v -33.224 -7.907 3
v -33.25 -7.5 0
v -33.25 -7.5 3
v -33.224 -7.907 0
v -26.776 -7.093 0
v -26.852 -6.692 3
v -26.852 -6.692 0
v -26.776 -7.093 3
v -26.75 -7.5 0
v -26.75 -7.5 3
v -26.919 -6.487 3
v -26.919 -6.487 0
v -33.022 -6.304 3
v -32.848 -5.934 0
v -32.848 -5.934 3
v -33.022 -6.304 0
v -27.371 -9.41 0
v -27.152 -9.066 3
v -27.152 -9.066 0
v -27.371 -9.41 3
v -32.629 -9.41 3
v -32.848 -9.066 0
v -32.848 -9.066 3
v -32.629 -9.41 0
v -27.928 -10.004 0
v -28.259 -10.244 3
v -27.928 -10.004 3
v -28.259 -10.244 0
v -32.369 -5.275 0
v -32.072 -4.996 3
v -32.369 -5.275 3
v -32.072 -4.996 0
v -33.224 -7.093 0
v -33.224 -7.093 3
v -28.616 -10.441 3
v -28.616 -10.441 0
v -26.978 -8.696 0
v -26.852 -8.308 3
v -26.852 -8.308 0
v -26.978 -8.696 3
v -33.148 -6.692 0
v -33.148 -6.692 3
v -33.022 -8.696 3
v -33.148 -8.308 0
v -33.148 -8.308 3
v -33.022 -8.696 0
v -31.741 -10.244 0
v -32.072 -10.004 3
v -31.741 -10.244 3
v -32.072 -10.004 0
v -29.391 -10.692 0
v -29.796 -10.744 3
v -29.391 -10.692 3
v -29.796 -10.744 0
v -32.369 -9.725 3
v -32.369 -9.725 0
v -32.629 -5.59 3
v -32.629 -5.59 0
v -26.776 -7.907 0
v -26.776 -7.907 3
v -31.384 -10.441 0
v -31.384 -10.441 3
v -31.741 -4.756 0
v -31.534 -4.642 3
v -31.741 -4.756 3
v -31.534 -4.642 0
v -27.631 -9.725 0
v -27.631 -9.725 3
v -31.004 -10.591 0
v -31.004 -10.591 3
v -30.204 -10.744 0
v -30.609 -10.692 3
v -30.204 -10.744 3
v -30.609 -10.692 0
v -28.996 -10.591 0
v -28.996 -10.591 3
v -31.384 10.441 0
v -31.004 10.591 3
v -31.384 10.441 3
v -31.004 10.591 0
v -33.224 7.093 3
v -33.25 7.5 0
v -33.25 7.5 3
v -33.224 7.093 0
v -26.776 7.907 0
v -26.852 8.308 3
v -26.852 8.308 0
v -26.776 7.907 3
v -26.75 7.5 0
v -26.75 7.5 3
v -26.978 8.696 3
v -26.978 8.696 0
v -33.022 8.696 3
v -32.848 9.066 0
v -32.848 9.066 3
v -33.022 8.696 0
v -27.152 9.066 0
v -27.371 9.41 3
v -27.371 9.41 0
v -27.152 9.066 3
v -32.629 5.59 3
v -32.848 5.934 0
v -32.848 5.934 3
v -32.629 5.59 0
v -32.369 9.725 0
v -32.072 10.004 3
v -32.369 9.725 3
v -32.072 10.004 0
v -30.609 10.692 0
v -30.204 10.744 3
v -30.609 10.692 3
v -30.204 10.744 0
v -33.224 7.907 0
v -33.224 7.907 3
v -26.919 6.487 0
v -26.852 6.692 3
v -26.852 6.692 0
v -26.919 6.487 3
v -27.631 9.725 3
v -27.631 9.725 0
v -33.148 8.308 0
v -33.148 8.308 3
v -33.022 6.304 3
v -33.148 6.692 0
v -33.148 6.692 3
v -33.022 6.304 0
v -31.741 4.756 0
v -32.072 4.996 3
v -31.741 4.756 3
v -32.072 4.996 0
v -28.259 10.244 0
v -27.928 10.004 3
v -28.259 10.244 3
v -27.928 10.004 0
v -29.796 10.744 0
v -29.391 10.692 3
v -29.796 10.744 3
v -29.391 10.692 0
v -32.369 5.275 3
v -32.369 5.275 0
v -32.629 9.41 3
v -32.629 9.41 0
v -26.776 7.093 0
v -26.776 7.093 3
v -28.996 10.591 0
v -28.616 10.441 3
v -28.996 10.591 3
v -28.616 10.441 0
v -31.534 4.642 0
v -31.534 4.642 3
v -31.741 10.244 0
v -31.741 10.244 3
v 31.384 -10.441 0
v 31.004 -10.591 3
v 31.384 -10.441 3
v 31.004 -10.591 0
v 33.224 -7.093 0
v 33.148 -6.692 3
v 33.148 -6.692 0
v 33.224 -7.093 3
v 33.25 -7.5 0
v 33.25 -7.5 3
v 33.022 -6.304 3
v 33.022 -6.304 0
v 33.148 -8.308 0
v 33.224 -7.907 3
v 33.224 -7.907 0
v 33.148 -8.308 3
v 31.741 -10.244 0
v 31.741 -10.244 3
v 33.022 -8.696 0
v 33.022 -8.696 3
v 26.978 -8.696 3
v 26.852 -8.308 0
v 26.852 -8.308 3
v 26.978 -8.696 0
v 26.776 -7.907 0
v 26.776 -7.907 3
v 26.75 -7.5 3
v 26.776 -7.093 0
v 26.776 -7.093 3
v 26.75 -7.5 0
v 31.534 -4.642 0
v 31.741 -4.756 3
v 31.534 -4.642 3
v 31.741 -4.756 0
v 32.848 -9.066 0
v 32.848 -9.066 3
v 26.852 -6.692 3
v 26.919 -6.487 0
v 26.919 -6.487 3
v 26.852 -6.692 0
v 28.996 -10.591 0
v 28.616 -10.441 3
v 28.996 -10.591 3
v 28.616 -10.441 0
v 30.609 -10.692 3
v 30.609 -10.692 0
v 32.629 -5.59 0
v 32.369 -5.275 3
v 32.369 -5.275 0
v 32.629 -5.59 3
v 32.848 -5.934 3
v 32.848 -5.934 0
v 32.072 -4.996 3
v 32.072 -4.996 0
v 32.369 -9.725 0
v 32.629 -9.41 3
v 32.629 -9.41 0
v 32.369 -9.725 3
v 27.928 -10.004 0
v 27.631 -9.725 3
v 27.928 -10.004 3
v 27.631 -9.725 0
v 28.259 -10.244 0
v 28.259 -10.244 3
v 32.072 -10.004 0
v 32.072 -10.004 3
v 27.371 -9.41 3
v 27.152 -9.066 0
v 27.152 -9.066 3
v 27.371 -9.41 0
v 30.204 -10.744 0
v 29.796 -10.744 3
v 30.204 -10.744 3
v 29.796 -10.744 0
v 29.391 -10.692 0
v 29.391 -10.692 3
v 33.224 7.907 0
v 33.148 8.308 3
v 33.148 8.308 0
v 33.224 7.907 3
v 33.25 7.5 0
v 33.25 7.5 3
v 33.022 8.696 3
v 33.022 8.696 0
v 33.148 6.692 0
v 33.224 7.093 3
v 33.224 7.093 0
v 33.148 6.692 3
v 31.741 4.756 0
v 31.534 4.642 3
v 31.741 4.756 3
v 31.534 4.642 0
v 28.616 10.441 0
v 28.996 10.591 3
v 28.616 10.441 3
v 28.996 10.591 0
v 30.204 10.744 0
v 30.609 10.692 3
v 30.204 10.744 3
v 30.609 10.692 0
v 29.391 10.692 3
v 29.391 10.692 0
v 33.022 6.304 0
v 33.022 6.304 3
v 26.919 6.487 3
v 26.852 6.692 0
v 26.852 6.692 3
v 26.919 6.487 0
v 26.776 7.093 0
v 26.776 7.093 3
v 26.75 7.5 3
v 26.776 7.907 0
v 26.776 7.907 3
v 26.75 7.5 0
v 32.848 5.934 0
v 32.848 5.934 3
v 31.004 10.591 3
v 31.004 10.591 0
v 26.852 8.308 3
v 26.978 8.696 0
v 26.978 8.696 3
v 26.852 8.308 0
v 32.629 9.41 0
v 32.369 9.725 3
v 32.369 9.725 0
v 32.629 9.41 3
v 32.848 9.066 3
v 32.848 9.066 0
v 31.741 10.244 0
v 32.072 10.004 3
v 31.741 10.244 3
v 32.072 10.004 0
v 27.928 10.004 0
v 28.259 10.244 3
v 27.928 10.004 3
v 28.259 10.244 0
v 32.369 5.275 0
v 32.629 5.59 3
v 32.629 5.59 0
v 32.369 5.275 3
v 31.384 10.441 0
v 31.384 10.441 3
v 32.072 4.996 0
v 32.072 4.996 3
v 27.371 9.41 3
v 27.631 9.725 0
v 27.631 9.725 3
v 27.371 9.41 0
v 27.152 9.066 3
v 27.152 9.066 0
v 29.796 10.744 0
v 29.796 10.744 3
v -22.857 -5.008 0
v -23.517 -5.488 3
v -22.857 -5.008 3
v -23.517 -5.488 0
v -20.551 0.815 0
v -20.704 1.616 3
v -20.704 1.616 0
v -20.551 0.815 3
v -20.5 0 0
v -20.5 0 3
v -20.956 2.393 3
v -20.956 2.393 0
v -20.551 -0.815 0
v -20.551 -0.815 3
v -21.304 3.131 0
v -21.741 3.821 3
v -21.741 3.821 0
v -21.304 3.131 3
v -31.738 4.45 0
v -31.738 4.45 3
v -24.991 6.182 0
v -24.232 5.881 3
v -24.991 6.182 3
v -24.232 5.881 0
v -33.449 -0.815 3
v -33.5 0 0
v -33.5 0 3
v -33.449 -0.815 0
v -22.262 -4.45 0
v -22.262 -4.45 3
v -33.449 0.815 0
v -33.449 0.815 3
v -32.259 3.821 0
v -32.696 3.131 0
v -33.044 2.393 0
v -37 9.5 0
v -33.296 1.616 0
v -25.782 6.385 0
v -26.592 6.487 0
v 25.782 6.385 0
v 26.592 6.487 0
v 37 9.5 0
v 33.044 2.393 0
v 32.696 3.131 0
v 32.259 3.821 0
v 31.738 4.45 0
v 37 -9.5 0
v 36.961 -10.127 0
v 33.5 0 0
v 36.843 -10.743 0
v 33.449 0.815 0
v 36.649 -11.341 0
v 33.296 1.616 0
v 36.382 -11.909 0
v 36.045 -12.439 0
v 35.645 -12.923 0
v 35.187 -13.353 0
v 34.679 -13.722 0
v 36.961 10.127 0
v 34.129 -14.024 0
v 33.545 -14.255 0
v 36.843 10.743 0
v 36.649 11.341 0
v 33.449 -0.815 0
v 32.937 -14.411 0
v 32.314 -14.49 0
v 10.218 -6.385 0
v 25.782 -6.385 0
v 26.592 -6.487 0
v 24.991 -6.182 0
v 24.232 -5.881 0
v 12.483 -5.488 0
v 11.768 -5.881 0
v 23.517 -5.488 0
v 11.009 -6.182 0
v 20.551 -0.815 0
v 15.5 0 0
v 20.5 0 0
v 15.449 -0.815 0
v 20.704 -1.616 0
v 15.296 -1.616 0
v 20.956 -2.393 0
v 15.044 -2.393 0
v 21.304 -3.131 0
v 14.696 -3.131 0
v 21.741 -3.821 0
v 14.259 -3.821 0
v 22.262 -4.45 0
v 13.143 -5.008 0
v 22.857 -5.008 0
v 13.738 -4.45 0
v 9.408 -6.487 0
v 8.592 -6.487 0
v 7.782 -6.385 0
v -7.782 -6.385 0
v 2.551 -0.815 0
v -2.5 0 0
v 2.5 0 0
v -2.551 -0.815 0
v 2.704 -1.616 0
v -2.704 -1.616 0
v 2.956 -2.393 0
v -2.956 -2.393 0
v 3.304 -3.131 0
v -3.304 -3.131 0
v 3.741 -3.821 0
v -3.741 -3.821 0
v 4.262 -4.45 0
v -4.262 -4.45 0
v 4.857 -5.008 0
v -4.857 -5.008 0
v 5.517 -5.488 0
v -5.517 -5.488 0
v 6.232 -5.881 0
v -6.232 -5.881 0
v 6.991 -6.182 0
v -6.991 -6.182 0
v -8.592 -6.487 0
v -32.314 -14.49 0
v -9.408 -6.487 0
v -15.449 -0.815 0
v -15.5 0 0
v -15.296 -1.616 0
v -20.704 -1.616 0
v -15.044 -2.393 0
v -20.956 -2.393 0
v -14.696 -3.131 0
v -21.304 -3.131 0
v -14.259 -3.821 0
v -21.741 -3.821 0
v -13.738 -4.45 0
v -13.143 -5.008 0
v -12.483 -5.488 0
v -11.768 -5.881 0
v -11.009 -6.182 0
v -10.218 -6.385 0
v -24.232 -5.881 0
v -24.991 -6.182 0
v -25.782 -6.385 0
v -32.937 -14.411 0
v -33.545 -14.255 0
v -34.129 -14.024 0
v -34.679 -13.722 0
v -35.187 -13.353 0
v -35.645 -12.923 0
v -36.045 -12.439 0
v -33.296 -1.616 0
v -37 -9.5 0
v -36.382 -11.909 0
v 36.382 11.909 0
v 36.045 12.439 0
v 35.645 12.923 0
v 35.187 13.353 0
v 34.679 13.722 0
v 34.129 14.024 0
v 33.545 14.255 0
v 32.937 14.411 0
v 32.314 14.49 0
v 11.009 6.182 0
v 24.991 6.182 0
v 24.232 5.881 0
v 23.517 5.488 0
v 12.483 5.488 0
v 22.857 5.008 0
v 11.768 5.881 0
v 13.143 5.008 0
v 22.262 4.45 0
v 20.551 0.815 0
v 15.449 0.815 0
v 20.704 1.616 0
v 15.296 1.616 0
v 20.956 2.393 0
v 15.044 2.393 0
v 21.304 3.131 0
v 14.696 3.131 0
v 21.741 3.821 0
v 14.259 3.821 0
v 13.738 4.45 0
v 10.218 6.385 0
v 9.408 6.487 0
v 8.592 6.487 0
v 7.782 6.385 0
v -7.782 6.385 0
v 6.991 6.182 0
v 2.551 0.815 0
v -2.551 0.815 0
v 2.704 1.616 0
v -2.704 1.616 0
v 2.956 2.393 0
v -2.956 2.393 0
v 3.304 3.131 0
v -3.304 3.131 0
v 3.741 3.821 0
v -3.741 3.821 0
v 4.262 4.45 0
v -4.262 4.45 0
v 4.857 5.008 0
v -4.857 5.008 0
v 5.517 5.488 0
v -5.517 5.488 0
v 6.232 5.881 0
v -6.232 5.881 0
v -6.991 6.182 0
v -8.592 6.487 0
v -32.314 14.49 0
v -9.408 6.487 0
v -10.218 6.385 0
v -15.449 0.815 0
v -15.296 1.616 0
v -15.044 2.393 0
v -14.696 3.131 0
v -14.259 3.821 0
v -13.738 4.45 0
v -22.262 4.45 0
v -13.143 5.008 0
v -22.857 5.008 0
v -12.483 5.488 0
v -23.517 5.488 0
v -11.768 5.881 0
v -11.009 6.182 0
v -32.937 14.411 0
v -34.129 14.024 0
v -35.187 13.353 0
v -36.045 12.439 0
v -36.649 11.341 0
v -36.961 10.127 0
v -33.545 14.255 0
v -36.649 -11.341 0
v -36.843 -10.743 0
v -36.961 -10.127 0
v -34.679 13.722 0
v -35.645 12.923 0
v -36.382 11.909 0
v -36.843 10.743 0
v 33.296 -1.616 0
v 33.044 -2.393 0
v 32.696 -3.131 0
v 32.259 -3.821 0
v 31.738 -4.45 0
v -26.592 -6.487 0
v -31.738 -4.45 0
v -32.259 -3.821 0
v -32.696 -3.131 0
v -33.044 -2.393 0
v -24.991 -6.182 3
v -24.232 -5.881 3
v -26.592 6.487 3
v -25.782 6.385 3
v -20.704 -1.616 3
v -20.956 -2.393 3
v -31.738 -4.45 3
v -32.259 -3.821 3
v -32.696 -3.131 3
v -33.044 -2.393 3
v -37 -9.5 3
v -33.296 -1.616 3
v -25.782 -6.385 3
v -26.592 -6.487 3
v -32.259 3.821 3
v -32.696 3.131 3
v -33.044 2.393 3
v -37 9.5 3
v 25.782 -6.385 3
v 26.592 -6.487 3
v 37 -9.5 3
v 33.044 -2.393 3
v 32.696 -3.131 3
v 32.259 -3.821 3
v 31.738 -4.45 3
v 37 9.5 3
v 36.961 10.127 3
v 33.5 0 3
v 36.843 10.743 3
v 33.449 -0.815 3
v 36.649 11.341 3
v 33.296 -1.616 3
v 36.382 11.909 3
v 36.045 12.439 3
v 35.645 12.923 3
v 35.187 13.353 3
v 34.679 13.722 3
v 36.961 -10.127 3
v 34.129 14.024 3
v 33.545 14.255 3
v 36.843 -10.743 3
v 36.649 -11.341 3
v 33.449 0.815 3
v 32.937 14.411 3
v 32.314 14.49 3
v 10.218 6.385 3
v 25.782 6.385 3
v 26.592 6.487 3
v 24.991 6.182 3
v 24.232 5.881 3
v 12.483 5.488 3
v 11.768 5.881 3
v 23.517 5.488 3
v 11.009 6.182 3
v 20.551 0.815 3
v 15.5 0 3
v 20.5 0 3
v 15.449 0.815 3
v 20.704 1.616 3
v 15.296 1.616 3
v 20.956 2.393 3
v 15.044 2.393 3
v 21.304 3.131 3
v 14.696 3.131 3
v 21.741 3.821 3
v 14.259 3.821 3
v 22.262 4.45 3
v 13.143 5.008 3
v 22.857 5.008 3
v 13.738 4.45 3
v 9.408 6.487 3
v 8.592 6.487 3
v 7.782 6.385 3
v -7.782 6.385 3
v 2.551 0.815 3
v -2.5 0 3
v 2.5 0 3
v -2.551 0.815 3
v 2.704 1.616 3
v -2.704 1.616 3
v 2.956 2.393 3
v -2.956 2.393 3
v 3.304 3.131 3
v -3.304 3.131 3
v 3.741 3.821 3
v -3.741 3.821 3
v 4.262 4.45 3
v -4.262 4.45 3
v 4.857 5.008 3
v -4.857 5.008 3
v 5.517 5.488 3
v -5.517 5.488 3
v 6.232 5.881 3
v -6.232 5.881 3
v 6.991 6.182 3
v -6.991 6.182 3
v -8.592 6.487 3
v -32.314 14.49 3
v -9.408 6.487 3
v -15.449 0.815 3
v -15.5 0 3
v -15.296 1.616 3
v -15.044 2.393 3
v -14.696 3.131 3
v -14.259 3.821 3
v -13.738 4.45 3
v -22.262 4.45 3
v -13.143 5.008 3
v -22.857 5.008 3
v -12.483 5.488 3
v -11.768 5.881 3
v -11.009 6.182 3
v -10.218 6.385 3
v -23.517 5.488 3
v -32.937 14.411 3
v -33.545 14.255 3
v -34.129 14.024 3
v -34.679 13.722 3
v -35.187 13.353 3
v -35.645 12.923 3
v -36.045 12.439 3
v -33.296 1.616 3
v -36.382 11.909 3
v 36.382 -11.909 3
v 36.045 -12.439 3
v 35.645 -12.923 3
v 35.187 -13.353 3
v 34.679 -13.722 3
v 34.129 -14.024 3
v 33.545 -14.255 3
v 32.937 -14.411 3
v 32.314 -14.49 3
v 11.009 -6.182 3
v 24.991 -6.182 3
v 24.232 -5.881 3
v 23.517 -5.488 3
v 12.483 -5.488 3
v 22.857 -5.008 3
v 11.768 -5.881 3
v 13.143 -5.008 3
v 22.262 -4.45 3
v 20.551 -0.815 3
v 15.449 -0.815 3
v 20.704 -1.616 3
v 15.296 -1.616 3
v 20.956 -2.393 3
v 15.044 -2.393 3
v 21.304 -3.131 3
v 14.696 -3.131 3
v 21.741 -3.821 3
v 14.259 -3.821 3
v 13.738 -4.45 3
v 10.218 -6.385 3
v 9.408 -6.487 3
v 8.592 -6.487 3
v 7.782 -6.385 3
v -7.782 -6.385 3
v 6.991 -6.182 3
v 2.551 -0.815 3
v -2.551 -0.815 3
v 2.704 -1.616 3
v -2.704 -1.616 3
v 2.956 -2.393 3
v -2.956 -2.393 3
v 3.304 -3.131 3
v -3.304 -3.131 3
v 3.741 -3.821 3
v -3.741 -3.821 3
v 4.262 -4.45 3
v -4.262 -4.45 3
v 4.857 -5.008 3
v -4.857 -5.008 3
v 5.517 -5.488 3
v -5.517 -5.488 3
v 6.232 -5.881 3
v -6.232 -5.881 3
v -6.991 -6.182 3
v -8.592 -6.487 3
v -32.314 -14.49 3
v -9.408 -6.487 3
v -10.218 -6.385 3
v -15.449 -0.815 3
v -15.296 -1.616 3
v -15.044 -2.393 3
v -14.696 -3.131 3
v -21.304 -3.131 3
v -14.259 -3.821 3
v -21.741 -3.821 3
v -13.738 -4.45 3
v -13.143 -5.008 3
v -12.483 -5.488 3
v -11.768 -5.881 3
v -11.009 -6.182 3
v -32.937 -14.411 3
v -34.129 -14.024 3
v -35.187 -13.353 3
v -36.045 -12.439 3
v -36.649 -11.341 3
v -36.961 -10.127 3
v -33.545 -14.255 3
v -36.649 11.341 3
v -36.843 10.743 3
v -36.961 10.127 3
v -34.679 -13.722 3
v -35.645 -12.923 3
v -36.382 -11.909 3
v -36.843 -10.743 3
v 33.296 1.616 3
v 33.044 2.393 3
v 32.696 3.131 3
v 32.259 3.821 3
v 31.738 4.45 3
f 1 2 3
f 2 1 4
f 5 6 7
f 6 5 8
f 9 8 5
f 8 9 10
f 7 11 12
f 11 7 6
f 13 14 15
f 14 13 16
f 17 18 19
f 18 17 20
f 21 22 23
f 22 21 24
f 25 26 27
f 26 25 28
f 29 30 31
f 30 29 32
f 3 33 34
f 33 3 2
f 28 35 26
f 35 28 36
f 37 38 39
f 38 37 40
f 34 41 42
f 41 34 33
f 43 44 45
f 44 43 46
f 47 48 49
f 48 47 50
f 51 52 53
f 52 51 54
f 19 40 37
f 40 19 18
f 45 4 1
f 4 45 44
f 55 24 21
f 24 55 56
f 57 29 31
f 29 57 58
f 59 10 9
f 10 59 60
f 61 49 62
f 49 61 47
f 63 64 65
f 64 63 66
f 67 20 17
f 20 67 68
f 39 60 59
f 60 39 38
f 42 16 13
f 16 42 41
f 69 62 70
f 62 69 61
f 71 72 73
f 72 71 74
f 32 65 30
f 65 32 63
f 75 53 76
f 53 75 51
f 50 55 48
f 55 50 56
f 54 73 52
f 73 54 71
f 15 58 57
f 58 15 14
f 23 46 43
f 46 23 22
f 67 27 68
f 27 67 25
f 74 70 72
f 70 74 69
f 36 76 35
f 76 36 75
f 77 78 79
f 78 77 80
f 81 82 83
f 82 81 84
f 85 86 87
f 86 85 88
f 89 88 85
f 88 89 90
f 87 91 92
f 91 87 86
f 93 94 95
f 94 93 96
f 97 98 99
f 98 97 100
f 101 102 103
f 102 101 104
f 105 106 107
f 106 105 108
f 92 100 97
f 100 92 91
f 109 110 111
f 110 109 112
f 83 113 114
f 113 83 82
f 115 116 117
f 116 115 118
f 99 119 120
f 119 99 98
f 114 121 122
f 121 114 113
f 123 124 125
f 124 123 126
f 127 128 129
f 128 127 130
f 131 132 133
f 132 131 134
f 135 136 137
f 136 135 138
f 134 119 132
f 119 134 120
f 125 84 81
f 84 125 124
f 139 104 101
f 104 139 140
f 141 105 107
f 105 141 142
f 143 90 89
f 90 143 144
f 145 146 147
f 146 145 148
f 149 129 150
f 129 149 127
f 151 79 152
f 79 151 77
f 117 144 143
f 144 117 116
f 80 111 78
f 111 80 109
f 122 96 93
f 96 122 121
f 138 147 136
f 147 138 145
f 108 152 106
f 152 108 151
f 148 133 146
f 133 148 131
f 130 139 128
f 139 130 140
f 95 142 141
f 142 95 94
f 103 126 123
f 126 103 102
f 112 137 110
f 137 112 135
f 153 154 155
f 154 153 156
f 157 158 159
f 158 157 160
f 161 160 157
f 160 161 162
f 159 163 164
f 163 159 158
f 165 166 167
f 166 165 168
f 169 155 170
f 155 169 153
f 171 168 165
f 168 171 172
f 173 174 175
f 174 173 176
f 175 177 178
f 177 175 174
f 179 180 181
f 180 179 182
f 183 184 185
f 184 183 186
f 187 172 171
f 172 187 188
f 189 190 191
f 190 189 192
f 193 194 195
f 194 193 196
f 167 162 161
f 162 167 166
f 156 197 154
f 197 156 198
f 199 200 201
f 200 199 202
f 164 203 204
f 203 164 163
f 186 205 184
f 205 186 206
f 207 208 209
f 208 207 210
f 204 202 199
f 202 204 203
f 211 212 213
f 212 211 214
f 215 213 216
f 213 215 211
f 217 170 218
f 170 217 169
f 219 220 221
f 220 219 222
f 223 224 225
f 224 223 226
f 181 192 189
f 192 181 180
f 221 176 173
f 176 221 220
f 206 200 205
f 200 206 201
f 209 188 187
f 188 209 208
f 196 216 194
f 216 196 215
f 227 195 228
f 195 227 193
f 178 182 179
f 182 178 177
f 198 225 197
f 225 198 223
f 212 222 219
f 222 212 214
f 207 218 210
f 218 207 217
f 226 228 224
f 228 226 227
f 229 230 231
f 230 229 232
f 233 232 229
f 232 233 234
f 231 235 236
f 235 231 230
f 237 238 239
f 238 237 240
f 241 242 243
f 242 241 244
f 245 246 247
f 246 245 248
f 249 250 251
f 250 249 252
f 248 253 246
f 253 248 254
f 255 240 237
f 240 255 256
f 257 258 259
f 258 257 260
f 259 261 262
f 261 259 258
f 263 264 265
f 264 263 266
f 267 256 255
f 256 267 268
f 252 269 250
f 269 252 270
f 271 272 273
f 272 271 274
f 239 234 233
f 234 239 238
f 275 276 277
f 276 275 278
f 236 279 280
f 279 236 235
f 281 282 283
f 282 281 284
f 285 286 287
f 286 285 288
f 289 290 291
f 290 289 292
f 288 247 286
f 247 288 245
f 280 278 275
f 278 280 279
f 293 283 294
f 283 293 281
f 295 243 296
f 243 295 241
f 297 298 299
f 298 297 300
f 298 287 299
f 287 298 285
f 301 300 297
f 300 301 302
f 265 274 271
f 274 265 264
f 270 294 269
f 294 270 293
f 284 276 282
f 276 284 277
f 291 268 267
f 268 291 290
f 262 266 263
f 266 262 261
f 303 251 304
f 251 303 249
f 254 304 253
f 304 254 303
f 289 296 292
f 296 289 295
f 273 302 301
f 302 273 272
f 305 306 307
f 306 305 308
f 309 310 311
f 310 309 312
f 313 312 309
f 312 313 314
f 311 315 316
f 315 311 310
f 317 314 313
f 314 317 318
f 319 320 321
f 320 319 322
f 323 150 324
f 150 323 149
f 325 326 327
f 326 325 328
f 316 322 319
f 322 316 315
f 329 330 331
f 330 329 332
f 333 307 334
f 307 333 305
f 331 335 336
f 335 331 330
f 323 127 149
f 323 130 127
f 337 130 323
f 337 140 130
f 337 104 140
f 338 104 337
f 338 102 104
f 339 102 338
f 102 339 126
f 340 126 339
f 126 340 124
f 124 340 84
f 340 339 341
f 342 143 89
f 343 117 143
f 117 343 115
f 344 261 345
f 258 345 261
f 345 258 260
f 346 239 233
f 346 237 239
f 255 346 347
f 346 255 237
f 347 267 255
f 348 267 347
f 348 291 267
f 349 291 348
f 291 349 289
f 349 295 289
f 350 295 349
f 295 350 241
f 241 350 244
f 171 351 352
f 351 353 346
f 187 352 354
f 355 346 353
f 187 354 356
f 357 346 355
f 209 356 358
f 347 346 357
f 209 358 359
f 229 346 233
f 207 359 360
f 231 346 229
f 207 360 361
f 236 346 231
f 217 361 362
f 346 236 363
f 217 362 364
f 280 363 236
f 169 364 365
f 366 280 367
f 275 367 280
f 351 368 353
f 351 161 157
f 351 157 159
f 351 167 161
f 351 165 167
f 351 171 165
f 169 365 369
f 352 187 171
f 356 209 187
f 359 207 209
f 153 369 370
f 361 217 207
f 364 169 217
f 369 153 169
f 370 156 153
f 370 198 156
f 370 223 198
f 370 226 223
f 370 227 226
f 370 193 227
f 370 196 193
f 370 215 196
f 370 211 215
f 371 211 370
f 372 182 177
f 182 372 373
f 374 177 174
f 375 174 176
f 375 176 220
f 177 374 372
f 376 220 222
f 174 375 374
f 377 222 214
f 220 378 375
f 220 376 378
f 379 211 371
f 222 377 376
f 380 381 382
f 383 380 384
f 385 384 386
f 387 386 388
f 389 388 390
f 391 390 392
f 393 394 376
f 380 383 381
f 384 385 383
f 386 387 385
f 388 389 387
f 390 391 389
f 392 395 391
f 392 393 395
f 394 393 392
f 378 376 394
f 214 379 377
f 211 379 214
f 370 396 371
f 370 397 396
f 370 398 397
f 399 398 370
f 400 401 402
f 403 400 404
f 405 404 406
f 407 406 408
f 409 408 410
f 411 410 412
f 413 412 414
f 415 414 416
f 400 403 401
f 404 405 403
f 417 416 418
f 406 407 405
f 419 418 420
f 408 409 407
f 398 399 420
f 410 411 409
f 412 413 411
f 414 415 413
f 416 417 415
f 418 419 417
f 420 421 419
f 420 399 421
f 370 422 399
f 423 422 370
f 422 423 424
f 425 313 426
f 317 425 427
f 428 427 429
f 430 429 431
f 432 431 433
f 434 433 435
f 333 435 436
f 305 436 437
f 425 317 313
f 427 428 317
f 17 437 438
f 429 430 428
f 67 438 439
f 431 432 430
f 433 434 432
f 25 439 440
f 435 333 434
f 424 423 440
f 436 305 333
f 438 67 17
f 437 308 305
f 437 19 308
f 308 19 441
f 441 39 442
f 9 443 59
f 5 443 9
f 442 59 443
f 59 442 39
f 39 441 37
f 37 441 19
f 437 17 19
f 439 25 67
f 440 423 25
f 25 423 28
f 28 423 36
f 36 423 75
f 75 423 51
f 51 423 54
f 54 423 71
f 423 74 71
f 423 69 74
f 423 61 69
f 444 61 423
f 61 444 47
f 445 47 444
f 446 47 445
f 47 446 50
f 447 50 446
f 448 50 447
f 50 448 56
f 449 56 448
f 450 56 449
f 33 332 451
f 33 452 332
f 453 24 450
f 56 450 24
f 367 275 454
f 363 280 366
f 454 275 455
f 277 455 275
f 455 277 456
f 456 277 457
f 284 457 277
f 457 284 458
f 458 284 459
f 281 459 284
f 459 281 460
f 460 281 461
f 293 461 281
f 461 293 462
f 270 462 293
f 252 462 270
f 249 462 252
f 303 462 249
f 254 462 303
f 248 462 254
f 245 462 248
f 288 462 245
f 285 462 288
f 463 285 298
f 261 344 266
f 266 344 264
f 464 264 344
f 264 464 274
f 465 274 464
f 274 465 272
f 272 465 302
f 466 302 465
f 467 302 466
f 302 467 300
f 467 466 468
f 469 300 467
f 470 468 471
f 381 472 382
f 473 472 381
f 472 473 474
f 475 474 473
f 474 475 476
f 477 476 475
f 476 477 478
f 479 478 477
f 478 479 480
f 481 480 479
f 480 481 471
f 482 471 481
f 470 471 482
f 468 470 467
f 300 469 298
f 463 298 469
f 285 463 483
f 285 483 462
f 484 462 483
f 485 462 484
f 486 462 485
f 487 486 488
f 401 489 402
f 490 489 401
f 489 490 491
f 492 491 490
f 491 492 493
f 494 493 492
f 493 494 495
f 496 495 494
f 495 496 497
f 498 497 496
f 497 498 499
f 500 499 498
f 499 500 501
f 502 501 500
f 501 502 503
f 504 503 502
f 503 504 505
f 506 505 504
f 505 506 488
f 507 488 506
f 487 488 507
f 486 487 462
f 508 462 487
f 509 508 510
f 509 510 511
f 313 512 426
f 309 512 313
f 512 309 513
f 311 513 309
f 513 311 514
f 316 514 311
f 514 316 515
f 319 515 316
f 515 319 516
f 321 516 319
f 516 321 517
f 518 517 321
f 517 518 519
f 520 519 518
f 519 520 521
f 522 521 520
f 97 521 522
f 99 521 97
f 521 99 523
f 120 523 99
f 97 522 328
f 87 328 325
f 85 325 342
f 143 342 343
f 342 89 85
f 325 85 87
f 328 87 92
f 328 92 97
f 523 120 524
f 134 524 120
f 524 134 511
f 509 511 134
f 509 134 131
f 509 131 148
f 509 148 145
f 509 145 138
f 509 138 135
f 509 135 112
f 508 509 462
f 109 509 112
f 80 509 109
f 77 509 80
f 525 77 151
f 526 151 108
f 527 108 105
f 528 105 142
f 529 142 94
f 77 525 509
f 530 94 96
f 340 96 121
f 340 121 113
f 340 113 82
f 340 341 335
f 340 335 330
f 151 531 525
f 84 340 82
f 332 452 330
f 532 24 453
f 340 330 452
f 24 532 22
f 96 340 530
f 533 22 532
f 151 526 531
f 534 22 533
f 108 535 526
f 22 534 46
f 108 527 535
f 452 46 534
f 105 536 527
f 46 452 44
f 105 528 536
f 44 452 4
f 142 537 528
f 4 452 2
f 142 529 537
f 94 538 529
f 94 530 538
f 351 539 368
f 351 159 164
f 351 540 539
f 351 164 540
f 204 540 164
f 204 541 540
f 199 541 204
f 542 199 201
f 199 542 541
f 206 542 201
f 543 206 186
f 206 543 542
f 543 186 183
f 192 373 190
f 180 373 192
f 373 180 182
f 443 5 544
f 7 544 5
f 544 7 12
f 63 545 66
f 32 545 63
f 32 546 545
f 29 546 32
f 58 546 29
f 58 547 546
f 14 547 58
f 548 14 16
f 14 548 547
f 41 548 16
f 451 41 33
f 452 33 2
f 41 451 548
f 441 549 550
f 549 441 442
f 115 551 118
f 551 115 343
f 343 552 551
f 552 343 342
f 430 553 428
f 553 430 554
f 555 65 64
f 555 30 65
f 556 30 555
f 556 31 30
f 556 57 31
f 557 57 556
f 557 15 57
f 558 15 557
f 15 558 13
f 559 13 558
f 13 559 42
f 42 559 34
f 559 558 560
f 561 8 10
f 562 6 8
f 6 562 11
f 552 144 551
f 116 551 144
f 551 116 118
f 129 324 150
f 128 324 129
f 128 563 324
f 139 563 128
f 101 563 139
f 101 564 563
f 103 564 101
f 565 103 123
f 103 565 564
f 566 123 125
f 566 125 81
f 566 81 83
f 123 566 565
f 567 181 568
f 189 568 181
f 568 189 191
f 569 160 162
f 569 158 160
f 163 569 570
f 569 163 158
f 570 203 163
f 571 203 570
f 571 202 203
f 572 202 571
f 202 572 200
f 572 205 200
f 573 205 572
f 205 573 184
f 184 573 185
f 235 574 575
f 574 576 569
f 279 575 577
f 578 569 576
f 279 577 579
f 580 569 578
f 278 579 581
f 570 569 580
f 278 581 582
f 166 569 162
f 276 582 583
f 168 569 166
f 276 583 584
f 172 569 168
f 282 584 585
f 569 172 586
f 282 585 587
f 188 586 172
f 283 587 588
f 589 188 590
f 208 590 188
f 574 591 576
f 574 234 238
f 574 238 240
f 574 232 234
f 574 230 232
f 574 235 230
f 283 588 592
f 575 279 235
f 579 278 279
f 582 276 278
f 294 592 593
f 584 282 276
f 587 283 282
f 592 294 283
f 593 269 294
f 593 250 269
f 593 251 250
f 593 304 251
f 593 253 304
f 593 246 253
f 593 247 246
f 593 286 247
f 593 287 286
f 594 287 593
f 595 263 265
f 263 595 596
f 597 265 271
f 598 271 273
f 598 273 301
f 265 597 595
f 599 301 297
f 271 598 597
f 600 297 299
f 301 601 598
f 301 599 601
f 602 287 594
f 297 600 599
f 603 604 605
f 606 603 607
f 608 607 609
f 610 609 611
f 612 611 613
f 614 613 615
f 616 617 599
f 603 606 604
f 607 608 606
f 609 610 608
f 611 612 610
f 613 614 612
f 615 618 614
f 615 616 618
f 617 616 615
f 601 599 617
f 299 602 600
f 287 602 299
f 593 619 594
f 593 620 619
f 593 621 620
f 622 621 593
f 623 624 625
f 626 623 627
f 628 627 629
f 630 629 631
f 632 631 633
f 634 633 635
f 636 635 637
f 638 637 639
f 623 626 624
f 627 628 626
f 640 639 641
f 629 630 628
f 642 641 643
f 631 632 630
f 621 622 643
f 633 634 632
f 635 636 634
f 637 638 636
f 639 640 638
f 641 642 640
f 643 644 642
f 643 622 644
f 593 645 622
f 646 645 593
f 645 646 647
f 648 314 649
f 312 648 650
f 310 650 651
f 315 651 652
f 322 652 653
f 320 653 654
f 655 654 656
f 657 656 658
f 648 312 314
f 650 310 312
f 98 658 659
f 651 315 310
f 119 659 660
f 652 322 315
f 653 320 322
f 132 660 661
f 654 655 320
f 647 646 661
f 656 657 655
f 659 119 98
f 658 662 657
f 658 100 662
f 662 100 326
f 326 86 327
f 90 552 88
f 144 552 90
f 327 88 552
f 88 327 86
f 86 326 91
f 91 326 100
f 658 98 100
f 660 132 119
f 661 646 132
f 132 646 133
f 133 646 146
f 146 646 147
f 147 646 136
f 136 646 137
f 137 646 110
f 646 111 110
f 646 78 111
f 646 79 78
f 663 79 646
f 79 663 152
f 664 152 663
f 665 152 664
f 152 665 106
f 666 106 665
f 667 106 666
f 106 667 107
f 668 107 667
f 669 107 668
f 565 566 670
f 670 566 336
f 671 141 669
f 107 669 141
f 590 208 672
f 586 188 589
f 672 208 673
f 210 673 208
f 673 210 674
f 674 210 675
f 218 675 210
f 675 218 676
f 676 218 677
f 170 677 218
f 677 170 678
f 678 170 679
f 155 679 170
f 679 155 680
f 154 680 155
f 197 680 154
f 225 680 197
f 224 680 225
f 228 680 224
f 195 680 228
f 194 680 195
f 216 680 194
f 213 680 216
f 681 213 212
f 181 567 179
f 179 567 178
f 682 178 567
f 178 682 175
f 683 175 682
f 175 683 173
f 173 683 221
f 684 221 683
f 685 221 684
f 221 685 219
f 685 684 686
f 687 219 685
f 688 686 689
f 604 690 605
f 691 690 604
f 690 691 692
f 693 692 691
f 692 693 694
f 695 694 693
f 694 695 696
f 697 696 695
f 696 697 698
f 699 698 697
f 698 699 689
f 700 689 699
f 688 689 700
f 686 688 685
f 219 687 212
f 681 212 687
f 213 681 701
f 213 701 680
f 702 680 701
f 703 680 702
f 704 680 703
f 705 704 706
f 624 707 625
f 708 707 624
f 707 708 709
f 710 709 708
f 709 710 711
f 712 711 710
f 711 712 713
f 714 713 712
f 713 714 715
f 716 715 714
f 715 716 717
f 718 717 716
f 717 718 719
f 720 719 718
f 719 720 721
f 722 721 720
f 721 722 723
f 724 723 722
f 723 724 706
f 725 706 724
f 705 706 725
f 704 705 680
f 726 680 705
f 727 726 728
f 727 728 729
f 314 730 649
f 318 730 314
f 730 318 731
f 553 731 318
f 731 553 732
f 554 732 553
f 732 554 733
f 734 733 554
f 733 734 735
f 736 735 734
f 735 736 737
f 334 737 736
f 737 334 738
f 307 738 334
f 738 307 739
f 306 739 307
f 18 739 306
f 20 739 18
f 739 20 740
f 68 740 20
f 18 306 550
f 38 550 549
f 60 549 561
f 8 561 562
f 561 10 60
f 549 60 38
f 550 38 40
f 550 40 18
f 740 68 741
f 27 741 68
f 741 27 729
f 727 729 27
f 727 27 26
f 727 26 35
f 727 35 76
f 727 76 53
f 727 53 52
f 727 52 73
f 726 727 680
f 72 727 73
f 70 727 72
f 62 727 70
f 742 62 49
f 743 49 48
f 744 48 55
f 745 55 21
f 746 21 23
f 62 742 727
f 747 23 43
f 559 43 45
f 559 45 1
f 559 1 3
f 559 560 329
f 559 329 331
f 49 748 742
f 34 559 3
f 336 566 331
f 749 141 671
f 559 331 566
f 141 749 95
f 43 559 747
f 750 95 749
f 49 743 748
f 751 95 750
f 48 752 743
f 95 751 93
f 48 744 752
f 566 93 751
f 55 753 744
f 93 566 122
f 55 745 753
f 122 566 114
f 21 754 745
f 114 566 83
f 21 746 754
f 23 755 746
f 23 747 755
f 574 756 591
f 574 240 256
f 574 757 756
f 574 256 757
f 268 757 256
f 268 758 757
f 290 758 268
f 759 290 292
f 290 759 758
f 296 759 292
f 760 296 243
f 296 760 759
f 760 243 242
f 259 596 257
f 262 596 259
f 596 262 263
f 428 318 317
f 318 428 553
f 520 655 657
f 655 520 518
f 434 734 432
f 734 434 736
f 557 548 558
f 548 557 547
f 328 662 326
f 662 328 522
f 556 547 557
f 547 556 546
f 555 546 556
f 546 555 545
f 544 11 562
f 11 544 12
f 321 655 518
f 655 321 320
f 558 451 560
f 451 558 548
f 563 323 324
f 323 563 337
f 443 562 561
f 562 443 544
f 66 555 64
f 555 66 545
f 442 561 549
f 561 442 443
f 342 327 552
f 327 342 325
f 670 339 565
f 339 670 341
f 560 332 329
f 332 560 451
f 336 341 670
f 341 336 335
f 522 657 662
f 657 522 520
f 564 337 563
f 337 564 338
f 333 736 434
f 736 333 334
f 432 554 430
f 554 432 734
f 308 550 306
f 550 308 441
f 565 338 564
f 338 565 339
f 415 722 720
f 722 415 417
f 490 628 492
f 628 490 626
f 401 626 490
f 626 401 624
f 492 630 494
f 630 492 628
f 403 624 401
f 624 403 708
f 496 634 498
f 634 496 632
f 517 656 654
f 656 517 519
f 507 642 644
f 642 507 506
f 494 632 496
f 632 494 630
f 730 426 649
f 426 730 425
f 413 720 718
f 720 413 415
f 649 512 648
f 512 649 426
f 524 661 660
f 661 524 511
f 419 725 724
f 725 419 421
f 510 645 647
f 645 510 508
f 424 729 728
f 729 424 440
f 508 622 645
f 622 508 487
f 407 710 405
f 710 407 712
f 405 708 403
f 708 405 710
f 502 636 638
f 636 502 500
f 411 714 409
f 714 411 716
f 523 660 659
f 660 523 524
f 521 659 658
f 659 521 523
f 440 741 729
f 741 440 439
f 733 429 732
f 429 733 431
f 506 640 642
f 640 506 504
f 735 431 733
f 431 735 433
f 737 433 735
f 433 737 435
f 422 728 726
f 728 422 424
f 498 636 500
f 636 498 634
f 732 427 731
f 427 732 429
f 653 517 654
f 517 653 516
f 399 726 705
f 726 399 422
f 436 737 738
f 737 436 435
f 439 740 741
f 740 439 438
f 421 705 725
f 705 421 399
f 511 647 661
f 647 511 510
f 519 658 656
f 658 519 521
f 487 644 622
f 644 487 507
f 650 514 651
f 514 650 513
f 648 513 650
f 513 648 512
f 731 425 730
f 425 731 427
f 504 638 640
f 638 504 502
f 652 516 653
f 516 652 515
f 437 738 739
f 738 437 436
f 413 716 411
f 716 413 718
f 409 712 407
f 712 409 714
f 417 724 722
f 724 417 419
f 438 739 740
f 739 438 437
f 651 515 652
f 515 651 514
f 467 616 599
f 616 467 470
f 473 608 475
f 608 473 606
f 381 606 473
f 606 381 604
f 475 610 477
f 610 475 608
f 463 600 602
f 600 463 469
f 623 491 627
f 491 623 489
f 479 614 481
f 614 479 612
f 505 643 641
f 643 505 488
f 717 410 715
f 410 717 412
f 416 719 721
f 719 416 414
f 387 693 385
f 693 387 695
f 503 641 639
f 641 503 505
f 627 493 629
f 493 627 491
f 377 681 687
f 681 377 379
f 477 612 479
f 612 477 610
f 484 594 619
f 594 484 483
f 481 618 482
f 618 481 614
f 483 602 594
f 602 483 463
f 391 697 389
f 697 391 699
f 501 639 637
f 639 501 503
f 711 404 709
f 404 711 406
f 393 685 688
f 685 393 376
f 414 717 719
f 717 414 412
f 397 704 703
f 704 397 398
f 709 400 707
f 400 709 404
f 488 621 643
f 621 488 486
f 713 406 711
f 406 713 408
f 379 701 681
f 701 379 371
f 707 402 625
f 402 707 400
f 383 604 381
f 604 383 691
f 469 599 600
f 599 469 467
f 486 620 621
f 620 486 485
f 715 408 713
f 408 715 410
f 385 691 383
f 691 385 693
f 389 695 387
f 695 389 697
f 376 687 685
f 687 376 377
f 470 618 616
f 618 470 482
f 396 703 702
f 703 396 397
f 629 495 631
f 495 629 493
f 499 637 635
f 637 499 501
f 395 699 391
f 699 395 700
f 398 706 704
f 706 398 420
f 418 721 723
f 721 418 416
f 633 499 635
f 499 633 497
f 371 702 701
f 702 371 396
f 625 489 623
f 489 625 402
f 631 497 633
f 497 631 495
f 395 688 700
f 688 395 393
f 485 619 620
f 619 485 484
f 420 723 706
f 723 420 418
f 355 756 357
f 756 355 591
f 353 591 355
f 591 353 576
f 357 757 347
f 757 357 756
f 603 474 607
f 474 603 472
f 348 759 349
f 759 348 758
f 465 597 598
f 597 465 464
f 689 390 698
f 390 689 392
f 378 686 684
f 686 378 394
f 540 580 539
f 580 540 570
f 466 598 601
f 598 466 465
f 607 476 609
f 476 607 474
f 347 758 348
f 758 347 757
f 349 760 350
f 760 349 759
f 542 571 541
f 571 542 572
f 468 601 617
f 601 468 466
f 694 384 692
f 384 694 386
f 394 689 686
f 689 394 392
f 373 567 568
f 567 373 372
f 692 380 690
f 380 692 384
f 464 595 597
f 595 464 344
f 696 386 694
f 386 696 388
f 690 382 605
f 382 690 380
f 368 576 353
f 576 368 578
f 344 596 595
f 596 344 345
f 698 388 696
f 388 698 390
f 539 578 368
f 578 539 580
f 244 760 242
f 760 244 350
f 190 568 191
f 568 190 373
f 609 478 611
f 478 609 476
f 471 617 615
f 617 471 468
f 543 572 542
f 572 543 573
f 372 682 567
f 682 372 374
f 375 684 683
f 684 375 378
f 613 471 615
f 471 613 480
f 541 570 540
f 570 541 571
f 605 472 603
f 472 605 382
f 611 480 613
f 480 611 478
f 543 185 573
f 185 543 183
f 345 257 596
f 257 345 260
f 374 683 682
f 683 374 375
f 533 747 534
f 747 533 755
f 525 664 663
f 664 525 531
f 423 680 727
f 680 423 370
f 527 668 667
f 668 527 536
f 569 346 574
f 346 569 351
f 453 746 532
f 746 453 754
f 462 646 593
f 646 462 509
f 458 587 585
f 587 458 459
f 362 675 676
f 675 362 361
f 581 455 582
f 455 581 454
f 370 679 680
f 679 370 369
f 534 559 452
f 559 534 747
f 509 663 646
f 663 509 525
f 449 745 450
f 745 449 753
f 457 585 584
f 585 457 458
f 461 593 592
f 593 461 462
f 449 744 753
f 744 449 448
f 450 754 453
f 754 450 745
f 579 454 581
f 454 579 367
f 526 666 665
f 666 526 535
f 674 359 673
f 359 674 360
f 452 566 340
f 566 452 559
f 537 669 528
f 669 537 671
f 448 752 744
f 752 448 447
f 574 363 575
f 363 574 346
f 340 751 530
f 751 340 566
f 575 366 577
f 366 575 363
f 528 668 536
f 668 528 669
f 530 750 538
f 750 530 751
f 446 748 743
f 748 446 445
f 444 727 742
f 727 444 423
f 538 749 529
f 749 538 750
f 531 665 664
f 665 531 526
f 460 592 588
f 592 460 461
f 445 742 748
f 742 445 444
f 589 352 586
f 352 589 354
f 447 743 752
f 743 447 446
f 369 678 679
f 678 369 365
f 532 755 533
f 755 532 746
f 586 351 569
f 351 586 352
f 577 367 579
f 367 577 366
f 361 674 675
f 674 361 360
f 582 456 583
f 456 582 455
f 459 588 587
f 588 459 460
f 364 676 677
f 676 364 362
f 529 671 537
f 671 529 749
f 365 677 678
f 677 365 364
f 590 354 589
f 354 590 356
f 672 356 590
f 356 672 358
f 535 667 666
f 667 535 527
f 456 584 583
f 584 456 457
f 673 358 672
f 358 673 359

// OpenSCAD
$fn = 50;


difference() {
	union() {
		hull() {
			translate(v = [-32.0000000000, 9.5000000000, 0]) {
				cylinder(h = 3, r = 5);
			}
			translate(v = [32.0000000000, 9.5000000000, 0]) {
				cylinder(h = 3, r = 5);
			}
			translate(v = [-32.0000000000, -9.5000000000, 0]) {
				cylinder(h = 3, r = 5);
			}
			translate(v = [32.0000000000, -9.5000000000, 0]) {
				cylinder(h = 3, r = 5);
			}
		}
	}
	union() {
		#translate(v = [-30.0000000000, -7.5000000000, -100.0000000000]) {
			cylinder(h = 200, r = 3.2500000000);
		}
		#translate(v = [-30.0000000000, 7.5000000000, -100.0000000000]) {
			cylinder(h = 200, r = 3.2500000000);
		}
		#translate(v = [30.0000000000, -7.5000000000, -100.0000000000]) {
			cylinder(h = 200, r = 3.2500000000);
		}
		#translate(v = [30.0000000000, 7.5000000000, -100.0000000000]) {
			cylinder(h = 200, r = 3.2500000000);
		}
		#translate(v = [-27.0000000000, 0, 0]) {
			cylinder(h = 3, r = 6.5000000000);
		}
		#translate(v = [-9.0000000000, 0, 0]) {
			cylinder(h = 3, r = 6.5000000000);
		}
		#translate(v = [9.0000000000, 0, 0]) {
			cylinder(h = 3, r = 6.5000000000);
		}
		#translate(v = [27.0000000000, 0, 0]) {
			cylinder(h = 3, r = 6.5000000000);
		}
	}
}
